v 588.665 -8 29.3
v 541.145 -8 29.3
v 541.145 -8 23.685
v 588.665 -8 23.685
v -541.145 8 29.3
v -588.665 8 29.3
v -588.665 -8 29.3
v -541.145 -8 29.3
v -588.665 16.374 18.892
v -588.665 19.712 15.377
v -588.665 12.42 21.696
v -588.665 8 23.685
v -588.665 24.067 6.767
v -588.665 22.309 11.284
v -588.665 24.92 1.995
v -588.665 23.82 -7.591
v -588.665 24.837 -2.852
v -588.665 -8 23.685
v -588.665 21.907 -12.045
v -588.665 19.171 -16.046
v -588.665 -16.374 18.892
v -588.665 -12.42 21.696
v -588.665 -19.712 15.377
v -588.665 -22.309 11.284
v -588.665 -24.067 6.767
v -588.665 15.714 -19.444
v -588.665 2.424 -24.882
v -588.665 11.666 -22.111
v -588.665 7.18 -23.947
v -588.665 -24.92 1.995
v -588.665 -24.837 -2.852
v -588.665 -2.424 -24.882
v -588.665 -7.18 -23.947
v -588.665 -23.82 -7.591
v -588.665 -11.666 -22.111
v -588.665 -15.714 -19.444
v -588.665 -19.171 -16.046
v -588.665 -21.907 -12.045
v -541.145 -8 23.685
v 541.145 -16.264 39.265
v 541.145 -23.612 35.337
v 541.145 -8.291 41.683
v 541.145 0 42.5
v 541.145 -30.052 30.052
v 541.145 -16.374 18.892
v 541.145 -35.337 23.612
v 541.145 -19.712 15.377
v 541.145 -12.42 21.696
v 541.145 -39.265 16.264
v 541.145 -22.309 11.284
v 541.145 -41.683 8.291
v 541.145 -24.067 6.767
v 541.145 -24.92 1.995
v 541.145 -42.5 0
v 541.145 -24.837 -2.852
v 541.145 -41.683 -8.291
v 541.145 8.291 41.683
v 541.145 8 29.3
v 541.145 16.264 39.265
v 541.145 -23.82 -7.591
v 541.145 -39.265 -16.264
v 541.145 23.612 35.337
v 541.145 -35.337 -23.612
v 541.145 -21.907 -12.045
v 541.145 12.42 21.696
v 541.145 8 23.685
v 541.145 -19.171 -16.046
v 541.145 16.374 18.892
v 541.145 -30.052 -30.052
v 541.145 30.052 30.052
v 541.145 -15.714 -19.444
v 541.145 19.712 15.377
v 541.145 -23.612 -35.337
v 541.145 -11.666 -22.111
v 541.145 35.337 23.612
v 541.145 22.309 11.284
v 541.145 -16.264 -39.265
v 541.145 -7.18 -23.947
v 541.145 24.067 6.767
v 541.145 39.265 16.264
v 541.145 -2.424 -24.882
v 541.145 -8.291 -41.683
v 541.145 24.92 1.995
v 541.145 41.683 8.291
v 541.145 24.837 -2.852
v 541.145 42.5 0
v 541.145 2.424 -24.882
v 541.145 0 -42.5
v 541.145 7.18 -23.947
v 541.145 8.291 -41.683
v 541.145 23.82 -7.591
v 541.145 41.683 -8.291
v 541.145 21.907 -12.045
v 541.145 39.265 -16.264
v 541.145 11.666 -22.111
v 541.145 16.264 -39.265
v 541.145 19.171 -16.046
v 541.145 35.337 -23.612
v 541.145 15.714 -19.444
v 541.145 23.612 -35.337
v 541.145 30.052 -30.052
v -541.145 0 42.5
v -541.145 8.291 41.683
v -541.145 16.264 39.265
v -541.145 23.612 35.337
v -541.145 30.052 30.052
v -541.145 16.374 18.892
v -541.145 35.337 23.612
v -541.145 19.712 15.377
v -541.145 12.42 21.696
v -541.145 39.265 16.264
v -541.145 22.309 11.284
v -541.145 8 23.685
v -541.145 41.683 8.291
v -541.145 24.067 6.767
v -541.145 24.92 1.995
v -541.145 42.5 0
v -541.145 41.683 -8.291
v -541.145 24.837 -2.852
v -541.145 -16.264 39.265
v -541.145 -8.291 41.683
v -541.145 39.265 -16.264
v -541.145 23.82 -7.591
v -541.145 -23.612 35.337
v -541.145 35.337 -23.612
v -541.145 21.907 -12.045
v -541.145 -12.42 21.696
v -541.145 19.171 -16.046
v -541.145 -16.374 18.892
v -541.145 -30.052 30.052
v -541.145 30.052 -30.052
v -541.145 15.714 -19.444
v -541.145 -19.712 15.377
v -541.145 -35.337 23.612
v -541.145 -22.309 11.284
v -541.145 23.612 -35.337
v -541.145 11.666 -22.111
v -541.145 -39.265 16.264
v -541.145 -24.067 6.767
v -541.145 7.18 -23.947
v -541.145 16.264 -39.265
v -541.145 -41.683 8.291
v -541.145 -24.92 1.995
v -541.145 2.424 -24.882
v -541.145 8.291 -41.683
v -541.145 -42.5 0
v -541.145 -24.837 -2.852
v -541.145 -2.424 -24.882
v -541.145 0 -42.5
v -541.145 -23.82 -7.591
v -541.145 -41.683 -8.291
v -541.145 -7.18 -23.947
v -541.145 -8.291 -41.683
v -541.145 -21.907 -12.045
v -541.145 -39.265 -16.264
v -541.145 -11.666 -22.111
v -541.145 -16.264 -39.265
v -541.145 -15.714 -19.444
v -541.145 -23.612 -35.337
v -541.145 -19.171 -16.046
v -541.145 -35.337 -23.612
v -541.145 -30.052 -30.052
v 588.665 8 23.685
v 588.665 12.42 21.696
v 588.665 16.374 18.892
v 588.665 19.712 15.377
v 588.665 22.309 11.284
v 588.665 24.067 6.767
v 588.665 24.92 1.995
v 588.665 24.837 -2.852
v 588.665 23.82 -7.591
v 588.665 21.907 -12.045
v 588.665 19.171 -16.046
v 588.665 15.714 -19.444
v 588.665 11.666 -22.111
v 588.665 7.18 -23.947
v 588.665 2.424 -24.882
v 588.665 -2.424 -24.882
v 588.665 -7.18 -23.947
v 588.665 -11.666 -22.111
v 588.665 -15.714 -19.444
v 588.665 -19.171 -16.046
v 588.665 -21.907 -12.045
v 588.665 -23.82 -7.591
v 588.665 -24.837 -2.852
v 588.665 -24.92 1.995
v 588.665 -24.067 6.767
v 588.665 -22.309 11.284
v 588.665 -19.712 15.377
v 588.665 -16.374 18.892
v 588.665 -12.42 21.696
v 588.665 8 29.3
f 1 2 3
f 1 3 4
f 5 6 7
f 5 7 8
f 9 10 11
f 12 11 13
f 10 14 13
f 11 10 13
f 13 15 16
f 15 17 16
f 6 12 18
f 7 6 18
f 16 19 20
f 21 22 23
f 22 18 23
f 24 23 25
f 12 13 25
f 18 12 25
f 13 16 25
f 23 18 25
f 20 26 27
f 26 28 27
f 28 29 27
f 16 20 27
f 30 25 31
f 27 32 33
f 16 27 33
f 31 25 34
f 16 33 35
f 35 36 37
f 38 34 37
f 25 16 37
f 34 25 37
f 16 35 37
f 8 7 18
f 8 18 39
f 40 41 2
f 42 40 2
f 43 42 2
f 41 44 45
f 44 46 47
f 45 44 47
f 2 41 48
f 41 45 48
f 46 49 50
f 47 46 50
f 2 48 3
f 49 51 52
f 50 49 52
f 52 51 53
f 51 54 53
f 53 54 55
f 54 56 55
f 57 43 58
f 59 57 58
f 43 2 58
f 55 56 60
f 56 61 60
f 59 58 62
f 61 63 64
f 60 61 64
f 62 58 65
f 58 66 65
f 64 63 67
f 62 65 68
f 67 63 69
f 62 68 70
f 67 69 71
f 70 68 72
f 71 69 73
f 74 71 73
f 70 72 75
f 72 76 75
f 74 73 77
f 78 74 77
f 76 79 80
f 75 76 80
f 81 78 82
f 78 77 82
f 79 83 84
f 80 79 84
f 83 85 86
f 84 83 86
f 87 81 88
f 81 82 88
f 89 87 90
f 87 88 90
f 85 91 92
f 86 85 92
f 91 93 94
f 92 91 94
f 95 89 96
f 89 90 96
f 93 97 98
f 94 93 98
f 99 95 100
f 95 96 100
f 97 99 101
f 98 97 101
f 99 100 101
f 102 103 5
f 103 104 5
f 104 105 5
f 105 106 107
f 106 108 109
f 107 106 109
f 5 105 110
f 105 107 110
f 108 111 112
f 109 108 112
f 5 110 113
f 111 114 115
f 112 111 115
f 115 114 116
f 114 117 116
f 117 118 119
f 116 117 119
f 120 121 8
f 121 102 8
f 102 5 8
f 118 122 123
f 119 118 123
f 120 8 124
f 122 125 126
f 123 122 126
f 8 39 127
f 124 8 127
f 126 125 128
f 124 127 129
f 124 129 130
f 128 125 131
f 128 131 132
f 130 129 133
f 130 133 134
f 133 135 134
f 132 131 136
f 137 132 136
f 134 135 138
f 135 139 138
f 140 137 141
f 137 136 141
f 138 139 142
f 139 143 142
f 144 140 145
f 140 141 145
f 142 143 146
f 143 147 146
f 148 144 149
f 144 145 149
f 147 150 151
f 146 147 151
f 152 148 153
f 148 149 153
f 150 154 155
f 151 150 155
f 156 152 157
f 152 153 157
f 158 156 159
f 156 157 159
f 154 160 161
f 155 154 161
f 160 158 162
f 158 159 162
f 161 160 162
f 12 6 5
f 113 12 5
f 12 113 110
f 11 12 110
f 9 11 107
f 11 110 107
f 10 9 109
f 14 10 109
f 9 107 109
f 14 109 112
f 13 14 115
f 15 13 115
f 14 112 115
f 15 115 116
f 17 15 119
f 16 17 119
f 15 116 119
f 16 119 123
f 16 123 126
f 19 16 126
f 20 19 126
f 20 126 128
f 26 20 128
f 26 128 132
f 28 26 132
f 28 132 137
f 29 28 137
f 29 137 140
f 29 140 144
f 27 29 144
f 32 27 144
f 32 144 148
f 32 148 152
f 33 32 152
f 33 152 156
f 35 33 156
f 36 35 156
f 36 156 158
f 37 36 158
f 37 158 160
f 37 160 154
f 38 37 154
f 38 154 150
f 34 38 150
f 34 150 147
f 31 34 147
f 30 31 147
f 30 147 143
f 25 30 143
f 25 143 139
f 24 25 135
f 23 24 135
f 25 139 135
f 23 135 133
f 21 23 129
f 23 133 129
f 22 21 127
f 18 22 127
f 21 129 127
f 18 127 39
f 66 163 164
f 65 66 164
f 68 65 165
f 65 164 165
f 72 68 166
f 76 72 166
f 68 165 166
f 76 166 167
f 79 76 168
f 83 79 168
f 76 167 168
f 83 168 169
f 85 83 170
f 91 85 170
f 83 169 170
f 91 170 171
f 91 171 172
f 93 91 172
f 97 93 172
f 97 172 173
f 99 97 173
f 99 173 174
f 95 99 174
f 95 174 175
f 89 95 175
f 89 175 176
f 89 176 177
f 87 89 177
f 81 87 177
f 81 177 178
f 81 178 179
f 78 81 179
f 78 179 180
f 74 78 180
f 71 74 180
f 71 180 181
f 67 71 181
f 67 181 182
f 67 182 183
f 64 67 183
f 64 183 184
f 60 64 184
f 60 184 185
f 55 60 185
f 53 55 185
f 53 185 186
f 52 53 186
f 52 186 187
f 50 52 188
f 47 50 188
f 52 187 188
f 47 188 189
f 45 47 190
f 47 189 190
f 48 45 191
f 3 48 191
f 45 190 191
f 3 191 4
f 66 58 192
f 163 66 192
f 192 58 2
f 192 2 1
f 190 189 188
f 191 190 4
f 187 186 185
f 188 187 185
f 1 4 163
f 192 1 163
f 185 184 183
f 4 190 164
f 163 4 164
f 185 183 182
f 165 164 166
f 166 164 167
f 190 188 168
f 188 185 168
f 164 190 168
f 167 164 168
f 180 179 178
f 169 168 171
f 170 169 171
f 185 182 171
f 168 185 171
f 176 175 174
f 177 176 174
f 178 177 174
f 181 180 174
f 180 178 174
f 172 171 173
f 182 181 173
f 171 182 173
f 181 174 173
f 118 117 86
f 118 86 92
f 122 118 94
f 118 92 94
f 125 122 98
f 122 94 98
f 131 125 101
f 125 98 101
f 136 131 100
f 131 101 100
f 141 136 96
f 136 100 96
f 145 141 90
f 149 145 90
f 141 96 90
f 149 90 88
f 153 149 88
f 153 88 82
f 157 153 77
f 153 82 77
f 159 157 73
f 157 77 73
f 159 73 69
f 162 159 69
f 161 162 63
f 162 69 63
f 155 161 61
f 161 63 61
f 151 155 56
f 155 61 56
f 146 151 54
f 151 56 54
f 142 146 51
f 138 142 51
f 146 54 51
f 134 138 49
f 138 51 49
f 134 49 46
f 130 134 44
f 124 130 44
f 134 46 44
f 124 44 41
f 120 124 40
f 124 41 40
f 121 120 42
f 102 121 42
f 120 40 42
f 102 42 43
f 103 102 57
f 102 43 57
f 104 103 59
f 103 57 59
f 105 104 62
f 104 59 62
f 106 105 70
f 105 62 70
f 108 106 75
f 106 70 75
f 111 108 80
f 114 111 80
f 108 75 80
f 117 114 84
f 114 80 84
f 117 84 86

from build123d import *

# Parameters (mm, degrees)
BOSS_EXTRUDE1_REACH      = 596.549
BOSS_EXTRUDE1_END_RADIUS = 25
SKETCH3_W                = 47.52
SKETCH3_H                = 16


with BuildPart() as part:
    # Sketch1 → Revolve1 (revolve)
    with BuildSketch(Plane.XY):
        Polygon((-588.665, 0), (-588.665, 25), (-541.145, 25), (-541.145, 42.5), (541.145, 42.5), (541.145, 25), (588.665, 25), (588.665, 0), align=None)
    revolve(axis=Axis((588.665, 0, 0), (-1, 0, 0)))

    # Boss-Extrude1: up to this cylinder (the profile starts outside it)
    boss_extrude1_end = Plane(origin=(0, 0, 0), z_dir=(1, 0, 0)) * Cylinder(BOSS_EXTRUDE1_END_RADIUS, 2373.908, mode=Mode.PRIVATE)
    # Sketch3 → Boss-Extrude1 (add, up to the surface)
    with BuildSketch(Plane.XY.offset(29.3), mode=Mode.PRIVATE) as boss_extrude1_sk1:
        with Locations((-564.905, 0)):
            Rectangle(SKETCH3_W, SKETCH3_H)
    boss_extrude1_tool1 = extrude(boss_extrude1_sk1.sketch, amount=-BOSS_EXTRUDE1_REACH, mode=Mode.PRIVATE) - boss_extrude1_end
    add(boss_extrude1_tool1.solids().sort_by_distance((-564.905, 0, 29.3))[0])
    # Sketch3 → Boss-Extrude1 (add, up to the surface)
    with BuildSketch(Plane.XY.offset(29.3), mode=Mode.PRIVATE) as boss_extrude1_sk2:
        with Locations((564.905, 0)):
            Rectangle(SKETCH3_W, SKETCH3_H)
    boss_extrude1_tool2 = extrude(boss_extrude1_sk2.sketch, amount=-BOSS_EXTRUDE1_REACH, mode=Mode.PRIVATE) - boss_extrude1_end
    add(boss_extrude1_tool2.solids().sort_by_distance((564.905, 0, 29.3))[0])


solid = part.part
